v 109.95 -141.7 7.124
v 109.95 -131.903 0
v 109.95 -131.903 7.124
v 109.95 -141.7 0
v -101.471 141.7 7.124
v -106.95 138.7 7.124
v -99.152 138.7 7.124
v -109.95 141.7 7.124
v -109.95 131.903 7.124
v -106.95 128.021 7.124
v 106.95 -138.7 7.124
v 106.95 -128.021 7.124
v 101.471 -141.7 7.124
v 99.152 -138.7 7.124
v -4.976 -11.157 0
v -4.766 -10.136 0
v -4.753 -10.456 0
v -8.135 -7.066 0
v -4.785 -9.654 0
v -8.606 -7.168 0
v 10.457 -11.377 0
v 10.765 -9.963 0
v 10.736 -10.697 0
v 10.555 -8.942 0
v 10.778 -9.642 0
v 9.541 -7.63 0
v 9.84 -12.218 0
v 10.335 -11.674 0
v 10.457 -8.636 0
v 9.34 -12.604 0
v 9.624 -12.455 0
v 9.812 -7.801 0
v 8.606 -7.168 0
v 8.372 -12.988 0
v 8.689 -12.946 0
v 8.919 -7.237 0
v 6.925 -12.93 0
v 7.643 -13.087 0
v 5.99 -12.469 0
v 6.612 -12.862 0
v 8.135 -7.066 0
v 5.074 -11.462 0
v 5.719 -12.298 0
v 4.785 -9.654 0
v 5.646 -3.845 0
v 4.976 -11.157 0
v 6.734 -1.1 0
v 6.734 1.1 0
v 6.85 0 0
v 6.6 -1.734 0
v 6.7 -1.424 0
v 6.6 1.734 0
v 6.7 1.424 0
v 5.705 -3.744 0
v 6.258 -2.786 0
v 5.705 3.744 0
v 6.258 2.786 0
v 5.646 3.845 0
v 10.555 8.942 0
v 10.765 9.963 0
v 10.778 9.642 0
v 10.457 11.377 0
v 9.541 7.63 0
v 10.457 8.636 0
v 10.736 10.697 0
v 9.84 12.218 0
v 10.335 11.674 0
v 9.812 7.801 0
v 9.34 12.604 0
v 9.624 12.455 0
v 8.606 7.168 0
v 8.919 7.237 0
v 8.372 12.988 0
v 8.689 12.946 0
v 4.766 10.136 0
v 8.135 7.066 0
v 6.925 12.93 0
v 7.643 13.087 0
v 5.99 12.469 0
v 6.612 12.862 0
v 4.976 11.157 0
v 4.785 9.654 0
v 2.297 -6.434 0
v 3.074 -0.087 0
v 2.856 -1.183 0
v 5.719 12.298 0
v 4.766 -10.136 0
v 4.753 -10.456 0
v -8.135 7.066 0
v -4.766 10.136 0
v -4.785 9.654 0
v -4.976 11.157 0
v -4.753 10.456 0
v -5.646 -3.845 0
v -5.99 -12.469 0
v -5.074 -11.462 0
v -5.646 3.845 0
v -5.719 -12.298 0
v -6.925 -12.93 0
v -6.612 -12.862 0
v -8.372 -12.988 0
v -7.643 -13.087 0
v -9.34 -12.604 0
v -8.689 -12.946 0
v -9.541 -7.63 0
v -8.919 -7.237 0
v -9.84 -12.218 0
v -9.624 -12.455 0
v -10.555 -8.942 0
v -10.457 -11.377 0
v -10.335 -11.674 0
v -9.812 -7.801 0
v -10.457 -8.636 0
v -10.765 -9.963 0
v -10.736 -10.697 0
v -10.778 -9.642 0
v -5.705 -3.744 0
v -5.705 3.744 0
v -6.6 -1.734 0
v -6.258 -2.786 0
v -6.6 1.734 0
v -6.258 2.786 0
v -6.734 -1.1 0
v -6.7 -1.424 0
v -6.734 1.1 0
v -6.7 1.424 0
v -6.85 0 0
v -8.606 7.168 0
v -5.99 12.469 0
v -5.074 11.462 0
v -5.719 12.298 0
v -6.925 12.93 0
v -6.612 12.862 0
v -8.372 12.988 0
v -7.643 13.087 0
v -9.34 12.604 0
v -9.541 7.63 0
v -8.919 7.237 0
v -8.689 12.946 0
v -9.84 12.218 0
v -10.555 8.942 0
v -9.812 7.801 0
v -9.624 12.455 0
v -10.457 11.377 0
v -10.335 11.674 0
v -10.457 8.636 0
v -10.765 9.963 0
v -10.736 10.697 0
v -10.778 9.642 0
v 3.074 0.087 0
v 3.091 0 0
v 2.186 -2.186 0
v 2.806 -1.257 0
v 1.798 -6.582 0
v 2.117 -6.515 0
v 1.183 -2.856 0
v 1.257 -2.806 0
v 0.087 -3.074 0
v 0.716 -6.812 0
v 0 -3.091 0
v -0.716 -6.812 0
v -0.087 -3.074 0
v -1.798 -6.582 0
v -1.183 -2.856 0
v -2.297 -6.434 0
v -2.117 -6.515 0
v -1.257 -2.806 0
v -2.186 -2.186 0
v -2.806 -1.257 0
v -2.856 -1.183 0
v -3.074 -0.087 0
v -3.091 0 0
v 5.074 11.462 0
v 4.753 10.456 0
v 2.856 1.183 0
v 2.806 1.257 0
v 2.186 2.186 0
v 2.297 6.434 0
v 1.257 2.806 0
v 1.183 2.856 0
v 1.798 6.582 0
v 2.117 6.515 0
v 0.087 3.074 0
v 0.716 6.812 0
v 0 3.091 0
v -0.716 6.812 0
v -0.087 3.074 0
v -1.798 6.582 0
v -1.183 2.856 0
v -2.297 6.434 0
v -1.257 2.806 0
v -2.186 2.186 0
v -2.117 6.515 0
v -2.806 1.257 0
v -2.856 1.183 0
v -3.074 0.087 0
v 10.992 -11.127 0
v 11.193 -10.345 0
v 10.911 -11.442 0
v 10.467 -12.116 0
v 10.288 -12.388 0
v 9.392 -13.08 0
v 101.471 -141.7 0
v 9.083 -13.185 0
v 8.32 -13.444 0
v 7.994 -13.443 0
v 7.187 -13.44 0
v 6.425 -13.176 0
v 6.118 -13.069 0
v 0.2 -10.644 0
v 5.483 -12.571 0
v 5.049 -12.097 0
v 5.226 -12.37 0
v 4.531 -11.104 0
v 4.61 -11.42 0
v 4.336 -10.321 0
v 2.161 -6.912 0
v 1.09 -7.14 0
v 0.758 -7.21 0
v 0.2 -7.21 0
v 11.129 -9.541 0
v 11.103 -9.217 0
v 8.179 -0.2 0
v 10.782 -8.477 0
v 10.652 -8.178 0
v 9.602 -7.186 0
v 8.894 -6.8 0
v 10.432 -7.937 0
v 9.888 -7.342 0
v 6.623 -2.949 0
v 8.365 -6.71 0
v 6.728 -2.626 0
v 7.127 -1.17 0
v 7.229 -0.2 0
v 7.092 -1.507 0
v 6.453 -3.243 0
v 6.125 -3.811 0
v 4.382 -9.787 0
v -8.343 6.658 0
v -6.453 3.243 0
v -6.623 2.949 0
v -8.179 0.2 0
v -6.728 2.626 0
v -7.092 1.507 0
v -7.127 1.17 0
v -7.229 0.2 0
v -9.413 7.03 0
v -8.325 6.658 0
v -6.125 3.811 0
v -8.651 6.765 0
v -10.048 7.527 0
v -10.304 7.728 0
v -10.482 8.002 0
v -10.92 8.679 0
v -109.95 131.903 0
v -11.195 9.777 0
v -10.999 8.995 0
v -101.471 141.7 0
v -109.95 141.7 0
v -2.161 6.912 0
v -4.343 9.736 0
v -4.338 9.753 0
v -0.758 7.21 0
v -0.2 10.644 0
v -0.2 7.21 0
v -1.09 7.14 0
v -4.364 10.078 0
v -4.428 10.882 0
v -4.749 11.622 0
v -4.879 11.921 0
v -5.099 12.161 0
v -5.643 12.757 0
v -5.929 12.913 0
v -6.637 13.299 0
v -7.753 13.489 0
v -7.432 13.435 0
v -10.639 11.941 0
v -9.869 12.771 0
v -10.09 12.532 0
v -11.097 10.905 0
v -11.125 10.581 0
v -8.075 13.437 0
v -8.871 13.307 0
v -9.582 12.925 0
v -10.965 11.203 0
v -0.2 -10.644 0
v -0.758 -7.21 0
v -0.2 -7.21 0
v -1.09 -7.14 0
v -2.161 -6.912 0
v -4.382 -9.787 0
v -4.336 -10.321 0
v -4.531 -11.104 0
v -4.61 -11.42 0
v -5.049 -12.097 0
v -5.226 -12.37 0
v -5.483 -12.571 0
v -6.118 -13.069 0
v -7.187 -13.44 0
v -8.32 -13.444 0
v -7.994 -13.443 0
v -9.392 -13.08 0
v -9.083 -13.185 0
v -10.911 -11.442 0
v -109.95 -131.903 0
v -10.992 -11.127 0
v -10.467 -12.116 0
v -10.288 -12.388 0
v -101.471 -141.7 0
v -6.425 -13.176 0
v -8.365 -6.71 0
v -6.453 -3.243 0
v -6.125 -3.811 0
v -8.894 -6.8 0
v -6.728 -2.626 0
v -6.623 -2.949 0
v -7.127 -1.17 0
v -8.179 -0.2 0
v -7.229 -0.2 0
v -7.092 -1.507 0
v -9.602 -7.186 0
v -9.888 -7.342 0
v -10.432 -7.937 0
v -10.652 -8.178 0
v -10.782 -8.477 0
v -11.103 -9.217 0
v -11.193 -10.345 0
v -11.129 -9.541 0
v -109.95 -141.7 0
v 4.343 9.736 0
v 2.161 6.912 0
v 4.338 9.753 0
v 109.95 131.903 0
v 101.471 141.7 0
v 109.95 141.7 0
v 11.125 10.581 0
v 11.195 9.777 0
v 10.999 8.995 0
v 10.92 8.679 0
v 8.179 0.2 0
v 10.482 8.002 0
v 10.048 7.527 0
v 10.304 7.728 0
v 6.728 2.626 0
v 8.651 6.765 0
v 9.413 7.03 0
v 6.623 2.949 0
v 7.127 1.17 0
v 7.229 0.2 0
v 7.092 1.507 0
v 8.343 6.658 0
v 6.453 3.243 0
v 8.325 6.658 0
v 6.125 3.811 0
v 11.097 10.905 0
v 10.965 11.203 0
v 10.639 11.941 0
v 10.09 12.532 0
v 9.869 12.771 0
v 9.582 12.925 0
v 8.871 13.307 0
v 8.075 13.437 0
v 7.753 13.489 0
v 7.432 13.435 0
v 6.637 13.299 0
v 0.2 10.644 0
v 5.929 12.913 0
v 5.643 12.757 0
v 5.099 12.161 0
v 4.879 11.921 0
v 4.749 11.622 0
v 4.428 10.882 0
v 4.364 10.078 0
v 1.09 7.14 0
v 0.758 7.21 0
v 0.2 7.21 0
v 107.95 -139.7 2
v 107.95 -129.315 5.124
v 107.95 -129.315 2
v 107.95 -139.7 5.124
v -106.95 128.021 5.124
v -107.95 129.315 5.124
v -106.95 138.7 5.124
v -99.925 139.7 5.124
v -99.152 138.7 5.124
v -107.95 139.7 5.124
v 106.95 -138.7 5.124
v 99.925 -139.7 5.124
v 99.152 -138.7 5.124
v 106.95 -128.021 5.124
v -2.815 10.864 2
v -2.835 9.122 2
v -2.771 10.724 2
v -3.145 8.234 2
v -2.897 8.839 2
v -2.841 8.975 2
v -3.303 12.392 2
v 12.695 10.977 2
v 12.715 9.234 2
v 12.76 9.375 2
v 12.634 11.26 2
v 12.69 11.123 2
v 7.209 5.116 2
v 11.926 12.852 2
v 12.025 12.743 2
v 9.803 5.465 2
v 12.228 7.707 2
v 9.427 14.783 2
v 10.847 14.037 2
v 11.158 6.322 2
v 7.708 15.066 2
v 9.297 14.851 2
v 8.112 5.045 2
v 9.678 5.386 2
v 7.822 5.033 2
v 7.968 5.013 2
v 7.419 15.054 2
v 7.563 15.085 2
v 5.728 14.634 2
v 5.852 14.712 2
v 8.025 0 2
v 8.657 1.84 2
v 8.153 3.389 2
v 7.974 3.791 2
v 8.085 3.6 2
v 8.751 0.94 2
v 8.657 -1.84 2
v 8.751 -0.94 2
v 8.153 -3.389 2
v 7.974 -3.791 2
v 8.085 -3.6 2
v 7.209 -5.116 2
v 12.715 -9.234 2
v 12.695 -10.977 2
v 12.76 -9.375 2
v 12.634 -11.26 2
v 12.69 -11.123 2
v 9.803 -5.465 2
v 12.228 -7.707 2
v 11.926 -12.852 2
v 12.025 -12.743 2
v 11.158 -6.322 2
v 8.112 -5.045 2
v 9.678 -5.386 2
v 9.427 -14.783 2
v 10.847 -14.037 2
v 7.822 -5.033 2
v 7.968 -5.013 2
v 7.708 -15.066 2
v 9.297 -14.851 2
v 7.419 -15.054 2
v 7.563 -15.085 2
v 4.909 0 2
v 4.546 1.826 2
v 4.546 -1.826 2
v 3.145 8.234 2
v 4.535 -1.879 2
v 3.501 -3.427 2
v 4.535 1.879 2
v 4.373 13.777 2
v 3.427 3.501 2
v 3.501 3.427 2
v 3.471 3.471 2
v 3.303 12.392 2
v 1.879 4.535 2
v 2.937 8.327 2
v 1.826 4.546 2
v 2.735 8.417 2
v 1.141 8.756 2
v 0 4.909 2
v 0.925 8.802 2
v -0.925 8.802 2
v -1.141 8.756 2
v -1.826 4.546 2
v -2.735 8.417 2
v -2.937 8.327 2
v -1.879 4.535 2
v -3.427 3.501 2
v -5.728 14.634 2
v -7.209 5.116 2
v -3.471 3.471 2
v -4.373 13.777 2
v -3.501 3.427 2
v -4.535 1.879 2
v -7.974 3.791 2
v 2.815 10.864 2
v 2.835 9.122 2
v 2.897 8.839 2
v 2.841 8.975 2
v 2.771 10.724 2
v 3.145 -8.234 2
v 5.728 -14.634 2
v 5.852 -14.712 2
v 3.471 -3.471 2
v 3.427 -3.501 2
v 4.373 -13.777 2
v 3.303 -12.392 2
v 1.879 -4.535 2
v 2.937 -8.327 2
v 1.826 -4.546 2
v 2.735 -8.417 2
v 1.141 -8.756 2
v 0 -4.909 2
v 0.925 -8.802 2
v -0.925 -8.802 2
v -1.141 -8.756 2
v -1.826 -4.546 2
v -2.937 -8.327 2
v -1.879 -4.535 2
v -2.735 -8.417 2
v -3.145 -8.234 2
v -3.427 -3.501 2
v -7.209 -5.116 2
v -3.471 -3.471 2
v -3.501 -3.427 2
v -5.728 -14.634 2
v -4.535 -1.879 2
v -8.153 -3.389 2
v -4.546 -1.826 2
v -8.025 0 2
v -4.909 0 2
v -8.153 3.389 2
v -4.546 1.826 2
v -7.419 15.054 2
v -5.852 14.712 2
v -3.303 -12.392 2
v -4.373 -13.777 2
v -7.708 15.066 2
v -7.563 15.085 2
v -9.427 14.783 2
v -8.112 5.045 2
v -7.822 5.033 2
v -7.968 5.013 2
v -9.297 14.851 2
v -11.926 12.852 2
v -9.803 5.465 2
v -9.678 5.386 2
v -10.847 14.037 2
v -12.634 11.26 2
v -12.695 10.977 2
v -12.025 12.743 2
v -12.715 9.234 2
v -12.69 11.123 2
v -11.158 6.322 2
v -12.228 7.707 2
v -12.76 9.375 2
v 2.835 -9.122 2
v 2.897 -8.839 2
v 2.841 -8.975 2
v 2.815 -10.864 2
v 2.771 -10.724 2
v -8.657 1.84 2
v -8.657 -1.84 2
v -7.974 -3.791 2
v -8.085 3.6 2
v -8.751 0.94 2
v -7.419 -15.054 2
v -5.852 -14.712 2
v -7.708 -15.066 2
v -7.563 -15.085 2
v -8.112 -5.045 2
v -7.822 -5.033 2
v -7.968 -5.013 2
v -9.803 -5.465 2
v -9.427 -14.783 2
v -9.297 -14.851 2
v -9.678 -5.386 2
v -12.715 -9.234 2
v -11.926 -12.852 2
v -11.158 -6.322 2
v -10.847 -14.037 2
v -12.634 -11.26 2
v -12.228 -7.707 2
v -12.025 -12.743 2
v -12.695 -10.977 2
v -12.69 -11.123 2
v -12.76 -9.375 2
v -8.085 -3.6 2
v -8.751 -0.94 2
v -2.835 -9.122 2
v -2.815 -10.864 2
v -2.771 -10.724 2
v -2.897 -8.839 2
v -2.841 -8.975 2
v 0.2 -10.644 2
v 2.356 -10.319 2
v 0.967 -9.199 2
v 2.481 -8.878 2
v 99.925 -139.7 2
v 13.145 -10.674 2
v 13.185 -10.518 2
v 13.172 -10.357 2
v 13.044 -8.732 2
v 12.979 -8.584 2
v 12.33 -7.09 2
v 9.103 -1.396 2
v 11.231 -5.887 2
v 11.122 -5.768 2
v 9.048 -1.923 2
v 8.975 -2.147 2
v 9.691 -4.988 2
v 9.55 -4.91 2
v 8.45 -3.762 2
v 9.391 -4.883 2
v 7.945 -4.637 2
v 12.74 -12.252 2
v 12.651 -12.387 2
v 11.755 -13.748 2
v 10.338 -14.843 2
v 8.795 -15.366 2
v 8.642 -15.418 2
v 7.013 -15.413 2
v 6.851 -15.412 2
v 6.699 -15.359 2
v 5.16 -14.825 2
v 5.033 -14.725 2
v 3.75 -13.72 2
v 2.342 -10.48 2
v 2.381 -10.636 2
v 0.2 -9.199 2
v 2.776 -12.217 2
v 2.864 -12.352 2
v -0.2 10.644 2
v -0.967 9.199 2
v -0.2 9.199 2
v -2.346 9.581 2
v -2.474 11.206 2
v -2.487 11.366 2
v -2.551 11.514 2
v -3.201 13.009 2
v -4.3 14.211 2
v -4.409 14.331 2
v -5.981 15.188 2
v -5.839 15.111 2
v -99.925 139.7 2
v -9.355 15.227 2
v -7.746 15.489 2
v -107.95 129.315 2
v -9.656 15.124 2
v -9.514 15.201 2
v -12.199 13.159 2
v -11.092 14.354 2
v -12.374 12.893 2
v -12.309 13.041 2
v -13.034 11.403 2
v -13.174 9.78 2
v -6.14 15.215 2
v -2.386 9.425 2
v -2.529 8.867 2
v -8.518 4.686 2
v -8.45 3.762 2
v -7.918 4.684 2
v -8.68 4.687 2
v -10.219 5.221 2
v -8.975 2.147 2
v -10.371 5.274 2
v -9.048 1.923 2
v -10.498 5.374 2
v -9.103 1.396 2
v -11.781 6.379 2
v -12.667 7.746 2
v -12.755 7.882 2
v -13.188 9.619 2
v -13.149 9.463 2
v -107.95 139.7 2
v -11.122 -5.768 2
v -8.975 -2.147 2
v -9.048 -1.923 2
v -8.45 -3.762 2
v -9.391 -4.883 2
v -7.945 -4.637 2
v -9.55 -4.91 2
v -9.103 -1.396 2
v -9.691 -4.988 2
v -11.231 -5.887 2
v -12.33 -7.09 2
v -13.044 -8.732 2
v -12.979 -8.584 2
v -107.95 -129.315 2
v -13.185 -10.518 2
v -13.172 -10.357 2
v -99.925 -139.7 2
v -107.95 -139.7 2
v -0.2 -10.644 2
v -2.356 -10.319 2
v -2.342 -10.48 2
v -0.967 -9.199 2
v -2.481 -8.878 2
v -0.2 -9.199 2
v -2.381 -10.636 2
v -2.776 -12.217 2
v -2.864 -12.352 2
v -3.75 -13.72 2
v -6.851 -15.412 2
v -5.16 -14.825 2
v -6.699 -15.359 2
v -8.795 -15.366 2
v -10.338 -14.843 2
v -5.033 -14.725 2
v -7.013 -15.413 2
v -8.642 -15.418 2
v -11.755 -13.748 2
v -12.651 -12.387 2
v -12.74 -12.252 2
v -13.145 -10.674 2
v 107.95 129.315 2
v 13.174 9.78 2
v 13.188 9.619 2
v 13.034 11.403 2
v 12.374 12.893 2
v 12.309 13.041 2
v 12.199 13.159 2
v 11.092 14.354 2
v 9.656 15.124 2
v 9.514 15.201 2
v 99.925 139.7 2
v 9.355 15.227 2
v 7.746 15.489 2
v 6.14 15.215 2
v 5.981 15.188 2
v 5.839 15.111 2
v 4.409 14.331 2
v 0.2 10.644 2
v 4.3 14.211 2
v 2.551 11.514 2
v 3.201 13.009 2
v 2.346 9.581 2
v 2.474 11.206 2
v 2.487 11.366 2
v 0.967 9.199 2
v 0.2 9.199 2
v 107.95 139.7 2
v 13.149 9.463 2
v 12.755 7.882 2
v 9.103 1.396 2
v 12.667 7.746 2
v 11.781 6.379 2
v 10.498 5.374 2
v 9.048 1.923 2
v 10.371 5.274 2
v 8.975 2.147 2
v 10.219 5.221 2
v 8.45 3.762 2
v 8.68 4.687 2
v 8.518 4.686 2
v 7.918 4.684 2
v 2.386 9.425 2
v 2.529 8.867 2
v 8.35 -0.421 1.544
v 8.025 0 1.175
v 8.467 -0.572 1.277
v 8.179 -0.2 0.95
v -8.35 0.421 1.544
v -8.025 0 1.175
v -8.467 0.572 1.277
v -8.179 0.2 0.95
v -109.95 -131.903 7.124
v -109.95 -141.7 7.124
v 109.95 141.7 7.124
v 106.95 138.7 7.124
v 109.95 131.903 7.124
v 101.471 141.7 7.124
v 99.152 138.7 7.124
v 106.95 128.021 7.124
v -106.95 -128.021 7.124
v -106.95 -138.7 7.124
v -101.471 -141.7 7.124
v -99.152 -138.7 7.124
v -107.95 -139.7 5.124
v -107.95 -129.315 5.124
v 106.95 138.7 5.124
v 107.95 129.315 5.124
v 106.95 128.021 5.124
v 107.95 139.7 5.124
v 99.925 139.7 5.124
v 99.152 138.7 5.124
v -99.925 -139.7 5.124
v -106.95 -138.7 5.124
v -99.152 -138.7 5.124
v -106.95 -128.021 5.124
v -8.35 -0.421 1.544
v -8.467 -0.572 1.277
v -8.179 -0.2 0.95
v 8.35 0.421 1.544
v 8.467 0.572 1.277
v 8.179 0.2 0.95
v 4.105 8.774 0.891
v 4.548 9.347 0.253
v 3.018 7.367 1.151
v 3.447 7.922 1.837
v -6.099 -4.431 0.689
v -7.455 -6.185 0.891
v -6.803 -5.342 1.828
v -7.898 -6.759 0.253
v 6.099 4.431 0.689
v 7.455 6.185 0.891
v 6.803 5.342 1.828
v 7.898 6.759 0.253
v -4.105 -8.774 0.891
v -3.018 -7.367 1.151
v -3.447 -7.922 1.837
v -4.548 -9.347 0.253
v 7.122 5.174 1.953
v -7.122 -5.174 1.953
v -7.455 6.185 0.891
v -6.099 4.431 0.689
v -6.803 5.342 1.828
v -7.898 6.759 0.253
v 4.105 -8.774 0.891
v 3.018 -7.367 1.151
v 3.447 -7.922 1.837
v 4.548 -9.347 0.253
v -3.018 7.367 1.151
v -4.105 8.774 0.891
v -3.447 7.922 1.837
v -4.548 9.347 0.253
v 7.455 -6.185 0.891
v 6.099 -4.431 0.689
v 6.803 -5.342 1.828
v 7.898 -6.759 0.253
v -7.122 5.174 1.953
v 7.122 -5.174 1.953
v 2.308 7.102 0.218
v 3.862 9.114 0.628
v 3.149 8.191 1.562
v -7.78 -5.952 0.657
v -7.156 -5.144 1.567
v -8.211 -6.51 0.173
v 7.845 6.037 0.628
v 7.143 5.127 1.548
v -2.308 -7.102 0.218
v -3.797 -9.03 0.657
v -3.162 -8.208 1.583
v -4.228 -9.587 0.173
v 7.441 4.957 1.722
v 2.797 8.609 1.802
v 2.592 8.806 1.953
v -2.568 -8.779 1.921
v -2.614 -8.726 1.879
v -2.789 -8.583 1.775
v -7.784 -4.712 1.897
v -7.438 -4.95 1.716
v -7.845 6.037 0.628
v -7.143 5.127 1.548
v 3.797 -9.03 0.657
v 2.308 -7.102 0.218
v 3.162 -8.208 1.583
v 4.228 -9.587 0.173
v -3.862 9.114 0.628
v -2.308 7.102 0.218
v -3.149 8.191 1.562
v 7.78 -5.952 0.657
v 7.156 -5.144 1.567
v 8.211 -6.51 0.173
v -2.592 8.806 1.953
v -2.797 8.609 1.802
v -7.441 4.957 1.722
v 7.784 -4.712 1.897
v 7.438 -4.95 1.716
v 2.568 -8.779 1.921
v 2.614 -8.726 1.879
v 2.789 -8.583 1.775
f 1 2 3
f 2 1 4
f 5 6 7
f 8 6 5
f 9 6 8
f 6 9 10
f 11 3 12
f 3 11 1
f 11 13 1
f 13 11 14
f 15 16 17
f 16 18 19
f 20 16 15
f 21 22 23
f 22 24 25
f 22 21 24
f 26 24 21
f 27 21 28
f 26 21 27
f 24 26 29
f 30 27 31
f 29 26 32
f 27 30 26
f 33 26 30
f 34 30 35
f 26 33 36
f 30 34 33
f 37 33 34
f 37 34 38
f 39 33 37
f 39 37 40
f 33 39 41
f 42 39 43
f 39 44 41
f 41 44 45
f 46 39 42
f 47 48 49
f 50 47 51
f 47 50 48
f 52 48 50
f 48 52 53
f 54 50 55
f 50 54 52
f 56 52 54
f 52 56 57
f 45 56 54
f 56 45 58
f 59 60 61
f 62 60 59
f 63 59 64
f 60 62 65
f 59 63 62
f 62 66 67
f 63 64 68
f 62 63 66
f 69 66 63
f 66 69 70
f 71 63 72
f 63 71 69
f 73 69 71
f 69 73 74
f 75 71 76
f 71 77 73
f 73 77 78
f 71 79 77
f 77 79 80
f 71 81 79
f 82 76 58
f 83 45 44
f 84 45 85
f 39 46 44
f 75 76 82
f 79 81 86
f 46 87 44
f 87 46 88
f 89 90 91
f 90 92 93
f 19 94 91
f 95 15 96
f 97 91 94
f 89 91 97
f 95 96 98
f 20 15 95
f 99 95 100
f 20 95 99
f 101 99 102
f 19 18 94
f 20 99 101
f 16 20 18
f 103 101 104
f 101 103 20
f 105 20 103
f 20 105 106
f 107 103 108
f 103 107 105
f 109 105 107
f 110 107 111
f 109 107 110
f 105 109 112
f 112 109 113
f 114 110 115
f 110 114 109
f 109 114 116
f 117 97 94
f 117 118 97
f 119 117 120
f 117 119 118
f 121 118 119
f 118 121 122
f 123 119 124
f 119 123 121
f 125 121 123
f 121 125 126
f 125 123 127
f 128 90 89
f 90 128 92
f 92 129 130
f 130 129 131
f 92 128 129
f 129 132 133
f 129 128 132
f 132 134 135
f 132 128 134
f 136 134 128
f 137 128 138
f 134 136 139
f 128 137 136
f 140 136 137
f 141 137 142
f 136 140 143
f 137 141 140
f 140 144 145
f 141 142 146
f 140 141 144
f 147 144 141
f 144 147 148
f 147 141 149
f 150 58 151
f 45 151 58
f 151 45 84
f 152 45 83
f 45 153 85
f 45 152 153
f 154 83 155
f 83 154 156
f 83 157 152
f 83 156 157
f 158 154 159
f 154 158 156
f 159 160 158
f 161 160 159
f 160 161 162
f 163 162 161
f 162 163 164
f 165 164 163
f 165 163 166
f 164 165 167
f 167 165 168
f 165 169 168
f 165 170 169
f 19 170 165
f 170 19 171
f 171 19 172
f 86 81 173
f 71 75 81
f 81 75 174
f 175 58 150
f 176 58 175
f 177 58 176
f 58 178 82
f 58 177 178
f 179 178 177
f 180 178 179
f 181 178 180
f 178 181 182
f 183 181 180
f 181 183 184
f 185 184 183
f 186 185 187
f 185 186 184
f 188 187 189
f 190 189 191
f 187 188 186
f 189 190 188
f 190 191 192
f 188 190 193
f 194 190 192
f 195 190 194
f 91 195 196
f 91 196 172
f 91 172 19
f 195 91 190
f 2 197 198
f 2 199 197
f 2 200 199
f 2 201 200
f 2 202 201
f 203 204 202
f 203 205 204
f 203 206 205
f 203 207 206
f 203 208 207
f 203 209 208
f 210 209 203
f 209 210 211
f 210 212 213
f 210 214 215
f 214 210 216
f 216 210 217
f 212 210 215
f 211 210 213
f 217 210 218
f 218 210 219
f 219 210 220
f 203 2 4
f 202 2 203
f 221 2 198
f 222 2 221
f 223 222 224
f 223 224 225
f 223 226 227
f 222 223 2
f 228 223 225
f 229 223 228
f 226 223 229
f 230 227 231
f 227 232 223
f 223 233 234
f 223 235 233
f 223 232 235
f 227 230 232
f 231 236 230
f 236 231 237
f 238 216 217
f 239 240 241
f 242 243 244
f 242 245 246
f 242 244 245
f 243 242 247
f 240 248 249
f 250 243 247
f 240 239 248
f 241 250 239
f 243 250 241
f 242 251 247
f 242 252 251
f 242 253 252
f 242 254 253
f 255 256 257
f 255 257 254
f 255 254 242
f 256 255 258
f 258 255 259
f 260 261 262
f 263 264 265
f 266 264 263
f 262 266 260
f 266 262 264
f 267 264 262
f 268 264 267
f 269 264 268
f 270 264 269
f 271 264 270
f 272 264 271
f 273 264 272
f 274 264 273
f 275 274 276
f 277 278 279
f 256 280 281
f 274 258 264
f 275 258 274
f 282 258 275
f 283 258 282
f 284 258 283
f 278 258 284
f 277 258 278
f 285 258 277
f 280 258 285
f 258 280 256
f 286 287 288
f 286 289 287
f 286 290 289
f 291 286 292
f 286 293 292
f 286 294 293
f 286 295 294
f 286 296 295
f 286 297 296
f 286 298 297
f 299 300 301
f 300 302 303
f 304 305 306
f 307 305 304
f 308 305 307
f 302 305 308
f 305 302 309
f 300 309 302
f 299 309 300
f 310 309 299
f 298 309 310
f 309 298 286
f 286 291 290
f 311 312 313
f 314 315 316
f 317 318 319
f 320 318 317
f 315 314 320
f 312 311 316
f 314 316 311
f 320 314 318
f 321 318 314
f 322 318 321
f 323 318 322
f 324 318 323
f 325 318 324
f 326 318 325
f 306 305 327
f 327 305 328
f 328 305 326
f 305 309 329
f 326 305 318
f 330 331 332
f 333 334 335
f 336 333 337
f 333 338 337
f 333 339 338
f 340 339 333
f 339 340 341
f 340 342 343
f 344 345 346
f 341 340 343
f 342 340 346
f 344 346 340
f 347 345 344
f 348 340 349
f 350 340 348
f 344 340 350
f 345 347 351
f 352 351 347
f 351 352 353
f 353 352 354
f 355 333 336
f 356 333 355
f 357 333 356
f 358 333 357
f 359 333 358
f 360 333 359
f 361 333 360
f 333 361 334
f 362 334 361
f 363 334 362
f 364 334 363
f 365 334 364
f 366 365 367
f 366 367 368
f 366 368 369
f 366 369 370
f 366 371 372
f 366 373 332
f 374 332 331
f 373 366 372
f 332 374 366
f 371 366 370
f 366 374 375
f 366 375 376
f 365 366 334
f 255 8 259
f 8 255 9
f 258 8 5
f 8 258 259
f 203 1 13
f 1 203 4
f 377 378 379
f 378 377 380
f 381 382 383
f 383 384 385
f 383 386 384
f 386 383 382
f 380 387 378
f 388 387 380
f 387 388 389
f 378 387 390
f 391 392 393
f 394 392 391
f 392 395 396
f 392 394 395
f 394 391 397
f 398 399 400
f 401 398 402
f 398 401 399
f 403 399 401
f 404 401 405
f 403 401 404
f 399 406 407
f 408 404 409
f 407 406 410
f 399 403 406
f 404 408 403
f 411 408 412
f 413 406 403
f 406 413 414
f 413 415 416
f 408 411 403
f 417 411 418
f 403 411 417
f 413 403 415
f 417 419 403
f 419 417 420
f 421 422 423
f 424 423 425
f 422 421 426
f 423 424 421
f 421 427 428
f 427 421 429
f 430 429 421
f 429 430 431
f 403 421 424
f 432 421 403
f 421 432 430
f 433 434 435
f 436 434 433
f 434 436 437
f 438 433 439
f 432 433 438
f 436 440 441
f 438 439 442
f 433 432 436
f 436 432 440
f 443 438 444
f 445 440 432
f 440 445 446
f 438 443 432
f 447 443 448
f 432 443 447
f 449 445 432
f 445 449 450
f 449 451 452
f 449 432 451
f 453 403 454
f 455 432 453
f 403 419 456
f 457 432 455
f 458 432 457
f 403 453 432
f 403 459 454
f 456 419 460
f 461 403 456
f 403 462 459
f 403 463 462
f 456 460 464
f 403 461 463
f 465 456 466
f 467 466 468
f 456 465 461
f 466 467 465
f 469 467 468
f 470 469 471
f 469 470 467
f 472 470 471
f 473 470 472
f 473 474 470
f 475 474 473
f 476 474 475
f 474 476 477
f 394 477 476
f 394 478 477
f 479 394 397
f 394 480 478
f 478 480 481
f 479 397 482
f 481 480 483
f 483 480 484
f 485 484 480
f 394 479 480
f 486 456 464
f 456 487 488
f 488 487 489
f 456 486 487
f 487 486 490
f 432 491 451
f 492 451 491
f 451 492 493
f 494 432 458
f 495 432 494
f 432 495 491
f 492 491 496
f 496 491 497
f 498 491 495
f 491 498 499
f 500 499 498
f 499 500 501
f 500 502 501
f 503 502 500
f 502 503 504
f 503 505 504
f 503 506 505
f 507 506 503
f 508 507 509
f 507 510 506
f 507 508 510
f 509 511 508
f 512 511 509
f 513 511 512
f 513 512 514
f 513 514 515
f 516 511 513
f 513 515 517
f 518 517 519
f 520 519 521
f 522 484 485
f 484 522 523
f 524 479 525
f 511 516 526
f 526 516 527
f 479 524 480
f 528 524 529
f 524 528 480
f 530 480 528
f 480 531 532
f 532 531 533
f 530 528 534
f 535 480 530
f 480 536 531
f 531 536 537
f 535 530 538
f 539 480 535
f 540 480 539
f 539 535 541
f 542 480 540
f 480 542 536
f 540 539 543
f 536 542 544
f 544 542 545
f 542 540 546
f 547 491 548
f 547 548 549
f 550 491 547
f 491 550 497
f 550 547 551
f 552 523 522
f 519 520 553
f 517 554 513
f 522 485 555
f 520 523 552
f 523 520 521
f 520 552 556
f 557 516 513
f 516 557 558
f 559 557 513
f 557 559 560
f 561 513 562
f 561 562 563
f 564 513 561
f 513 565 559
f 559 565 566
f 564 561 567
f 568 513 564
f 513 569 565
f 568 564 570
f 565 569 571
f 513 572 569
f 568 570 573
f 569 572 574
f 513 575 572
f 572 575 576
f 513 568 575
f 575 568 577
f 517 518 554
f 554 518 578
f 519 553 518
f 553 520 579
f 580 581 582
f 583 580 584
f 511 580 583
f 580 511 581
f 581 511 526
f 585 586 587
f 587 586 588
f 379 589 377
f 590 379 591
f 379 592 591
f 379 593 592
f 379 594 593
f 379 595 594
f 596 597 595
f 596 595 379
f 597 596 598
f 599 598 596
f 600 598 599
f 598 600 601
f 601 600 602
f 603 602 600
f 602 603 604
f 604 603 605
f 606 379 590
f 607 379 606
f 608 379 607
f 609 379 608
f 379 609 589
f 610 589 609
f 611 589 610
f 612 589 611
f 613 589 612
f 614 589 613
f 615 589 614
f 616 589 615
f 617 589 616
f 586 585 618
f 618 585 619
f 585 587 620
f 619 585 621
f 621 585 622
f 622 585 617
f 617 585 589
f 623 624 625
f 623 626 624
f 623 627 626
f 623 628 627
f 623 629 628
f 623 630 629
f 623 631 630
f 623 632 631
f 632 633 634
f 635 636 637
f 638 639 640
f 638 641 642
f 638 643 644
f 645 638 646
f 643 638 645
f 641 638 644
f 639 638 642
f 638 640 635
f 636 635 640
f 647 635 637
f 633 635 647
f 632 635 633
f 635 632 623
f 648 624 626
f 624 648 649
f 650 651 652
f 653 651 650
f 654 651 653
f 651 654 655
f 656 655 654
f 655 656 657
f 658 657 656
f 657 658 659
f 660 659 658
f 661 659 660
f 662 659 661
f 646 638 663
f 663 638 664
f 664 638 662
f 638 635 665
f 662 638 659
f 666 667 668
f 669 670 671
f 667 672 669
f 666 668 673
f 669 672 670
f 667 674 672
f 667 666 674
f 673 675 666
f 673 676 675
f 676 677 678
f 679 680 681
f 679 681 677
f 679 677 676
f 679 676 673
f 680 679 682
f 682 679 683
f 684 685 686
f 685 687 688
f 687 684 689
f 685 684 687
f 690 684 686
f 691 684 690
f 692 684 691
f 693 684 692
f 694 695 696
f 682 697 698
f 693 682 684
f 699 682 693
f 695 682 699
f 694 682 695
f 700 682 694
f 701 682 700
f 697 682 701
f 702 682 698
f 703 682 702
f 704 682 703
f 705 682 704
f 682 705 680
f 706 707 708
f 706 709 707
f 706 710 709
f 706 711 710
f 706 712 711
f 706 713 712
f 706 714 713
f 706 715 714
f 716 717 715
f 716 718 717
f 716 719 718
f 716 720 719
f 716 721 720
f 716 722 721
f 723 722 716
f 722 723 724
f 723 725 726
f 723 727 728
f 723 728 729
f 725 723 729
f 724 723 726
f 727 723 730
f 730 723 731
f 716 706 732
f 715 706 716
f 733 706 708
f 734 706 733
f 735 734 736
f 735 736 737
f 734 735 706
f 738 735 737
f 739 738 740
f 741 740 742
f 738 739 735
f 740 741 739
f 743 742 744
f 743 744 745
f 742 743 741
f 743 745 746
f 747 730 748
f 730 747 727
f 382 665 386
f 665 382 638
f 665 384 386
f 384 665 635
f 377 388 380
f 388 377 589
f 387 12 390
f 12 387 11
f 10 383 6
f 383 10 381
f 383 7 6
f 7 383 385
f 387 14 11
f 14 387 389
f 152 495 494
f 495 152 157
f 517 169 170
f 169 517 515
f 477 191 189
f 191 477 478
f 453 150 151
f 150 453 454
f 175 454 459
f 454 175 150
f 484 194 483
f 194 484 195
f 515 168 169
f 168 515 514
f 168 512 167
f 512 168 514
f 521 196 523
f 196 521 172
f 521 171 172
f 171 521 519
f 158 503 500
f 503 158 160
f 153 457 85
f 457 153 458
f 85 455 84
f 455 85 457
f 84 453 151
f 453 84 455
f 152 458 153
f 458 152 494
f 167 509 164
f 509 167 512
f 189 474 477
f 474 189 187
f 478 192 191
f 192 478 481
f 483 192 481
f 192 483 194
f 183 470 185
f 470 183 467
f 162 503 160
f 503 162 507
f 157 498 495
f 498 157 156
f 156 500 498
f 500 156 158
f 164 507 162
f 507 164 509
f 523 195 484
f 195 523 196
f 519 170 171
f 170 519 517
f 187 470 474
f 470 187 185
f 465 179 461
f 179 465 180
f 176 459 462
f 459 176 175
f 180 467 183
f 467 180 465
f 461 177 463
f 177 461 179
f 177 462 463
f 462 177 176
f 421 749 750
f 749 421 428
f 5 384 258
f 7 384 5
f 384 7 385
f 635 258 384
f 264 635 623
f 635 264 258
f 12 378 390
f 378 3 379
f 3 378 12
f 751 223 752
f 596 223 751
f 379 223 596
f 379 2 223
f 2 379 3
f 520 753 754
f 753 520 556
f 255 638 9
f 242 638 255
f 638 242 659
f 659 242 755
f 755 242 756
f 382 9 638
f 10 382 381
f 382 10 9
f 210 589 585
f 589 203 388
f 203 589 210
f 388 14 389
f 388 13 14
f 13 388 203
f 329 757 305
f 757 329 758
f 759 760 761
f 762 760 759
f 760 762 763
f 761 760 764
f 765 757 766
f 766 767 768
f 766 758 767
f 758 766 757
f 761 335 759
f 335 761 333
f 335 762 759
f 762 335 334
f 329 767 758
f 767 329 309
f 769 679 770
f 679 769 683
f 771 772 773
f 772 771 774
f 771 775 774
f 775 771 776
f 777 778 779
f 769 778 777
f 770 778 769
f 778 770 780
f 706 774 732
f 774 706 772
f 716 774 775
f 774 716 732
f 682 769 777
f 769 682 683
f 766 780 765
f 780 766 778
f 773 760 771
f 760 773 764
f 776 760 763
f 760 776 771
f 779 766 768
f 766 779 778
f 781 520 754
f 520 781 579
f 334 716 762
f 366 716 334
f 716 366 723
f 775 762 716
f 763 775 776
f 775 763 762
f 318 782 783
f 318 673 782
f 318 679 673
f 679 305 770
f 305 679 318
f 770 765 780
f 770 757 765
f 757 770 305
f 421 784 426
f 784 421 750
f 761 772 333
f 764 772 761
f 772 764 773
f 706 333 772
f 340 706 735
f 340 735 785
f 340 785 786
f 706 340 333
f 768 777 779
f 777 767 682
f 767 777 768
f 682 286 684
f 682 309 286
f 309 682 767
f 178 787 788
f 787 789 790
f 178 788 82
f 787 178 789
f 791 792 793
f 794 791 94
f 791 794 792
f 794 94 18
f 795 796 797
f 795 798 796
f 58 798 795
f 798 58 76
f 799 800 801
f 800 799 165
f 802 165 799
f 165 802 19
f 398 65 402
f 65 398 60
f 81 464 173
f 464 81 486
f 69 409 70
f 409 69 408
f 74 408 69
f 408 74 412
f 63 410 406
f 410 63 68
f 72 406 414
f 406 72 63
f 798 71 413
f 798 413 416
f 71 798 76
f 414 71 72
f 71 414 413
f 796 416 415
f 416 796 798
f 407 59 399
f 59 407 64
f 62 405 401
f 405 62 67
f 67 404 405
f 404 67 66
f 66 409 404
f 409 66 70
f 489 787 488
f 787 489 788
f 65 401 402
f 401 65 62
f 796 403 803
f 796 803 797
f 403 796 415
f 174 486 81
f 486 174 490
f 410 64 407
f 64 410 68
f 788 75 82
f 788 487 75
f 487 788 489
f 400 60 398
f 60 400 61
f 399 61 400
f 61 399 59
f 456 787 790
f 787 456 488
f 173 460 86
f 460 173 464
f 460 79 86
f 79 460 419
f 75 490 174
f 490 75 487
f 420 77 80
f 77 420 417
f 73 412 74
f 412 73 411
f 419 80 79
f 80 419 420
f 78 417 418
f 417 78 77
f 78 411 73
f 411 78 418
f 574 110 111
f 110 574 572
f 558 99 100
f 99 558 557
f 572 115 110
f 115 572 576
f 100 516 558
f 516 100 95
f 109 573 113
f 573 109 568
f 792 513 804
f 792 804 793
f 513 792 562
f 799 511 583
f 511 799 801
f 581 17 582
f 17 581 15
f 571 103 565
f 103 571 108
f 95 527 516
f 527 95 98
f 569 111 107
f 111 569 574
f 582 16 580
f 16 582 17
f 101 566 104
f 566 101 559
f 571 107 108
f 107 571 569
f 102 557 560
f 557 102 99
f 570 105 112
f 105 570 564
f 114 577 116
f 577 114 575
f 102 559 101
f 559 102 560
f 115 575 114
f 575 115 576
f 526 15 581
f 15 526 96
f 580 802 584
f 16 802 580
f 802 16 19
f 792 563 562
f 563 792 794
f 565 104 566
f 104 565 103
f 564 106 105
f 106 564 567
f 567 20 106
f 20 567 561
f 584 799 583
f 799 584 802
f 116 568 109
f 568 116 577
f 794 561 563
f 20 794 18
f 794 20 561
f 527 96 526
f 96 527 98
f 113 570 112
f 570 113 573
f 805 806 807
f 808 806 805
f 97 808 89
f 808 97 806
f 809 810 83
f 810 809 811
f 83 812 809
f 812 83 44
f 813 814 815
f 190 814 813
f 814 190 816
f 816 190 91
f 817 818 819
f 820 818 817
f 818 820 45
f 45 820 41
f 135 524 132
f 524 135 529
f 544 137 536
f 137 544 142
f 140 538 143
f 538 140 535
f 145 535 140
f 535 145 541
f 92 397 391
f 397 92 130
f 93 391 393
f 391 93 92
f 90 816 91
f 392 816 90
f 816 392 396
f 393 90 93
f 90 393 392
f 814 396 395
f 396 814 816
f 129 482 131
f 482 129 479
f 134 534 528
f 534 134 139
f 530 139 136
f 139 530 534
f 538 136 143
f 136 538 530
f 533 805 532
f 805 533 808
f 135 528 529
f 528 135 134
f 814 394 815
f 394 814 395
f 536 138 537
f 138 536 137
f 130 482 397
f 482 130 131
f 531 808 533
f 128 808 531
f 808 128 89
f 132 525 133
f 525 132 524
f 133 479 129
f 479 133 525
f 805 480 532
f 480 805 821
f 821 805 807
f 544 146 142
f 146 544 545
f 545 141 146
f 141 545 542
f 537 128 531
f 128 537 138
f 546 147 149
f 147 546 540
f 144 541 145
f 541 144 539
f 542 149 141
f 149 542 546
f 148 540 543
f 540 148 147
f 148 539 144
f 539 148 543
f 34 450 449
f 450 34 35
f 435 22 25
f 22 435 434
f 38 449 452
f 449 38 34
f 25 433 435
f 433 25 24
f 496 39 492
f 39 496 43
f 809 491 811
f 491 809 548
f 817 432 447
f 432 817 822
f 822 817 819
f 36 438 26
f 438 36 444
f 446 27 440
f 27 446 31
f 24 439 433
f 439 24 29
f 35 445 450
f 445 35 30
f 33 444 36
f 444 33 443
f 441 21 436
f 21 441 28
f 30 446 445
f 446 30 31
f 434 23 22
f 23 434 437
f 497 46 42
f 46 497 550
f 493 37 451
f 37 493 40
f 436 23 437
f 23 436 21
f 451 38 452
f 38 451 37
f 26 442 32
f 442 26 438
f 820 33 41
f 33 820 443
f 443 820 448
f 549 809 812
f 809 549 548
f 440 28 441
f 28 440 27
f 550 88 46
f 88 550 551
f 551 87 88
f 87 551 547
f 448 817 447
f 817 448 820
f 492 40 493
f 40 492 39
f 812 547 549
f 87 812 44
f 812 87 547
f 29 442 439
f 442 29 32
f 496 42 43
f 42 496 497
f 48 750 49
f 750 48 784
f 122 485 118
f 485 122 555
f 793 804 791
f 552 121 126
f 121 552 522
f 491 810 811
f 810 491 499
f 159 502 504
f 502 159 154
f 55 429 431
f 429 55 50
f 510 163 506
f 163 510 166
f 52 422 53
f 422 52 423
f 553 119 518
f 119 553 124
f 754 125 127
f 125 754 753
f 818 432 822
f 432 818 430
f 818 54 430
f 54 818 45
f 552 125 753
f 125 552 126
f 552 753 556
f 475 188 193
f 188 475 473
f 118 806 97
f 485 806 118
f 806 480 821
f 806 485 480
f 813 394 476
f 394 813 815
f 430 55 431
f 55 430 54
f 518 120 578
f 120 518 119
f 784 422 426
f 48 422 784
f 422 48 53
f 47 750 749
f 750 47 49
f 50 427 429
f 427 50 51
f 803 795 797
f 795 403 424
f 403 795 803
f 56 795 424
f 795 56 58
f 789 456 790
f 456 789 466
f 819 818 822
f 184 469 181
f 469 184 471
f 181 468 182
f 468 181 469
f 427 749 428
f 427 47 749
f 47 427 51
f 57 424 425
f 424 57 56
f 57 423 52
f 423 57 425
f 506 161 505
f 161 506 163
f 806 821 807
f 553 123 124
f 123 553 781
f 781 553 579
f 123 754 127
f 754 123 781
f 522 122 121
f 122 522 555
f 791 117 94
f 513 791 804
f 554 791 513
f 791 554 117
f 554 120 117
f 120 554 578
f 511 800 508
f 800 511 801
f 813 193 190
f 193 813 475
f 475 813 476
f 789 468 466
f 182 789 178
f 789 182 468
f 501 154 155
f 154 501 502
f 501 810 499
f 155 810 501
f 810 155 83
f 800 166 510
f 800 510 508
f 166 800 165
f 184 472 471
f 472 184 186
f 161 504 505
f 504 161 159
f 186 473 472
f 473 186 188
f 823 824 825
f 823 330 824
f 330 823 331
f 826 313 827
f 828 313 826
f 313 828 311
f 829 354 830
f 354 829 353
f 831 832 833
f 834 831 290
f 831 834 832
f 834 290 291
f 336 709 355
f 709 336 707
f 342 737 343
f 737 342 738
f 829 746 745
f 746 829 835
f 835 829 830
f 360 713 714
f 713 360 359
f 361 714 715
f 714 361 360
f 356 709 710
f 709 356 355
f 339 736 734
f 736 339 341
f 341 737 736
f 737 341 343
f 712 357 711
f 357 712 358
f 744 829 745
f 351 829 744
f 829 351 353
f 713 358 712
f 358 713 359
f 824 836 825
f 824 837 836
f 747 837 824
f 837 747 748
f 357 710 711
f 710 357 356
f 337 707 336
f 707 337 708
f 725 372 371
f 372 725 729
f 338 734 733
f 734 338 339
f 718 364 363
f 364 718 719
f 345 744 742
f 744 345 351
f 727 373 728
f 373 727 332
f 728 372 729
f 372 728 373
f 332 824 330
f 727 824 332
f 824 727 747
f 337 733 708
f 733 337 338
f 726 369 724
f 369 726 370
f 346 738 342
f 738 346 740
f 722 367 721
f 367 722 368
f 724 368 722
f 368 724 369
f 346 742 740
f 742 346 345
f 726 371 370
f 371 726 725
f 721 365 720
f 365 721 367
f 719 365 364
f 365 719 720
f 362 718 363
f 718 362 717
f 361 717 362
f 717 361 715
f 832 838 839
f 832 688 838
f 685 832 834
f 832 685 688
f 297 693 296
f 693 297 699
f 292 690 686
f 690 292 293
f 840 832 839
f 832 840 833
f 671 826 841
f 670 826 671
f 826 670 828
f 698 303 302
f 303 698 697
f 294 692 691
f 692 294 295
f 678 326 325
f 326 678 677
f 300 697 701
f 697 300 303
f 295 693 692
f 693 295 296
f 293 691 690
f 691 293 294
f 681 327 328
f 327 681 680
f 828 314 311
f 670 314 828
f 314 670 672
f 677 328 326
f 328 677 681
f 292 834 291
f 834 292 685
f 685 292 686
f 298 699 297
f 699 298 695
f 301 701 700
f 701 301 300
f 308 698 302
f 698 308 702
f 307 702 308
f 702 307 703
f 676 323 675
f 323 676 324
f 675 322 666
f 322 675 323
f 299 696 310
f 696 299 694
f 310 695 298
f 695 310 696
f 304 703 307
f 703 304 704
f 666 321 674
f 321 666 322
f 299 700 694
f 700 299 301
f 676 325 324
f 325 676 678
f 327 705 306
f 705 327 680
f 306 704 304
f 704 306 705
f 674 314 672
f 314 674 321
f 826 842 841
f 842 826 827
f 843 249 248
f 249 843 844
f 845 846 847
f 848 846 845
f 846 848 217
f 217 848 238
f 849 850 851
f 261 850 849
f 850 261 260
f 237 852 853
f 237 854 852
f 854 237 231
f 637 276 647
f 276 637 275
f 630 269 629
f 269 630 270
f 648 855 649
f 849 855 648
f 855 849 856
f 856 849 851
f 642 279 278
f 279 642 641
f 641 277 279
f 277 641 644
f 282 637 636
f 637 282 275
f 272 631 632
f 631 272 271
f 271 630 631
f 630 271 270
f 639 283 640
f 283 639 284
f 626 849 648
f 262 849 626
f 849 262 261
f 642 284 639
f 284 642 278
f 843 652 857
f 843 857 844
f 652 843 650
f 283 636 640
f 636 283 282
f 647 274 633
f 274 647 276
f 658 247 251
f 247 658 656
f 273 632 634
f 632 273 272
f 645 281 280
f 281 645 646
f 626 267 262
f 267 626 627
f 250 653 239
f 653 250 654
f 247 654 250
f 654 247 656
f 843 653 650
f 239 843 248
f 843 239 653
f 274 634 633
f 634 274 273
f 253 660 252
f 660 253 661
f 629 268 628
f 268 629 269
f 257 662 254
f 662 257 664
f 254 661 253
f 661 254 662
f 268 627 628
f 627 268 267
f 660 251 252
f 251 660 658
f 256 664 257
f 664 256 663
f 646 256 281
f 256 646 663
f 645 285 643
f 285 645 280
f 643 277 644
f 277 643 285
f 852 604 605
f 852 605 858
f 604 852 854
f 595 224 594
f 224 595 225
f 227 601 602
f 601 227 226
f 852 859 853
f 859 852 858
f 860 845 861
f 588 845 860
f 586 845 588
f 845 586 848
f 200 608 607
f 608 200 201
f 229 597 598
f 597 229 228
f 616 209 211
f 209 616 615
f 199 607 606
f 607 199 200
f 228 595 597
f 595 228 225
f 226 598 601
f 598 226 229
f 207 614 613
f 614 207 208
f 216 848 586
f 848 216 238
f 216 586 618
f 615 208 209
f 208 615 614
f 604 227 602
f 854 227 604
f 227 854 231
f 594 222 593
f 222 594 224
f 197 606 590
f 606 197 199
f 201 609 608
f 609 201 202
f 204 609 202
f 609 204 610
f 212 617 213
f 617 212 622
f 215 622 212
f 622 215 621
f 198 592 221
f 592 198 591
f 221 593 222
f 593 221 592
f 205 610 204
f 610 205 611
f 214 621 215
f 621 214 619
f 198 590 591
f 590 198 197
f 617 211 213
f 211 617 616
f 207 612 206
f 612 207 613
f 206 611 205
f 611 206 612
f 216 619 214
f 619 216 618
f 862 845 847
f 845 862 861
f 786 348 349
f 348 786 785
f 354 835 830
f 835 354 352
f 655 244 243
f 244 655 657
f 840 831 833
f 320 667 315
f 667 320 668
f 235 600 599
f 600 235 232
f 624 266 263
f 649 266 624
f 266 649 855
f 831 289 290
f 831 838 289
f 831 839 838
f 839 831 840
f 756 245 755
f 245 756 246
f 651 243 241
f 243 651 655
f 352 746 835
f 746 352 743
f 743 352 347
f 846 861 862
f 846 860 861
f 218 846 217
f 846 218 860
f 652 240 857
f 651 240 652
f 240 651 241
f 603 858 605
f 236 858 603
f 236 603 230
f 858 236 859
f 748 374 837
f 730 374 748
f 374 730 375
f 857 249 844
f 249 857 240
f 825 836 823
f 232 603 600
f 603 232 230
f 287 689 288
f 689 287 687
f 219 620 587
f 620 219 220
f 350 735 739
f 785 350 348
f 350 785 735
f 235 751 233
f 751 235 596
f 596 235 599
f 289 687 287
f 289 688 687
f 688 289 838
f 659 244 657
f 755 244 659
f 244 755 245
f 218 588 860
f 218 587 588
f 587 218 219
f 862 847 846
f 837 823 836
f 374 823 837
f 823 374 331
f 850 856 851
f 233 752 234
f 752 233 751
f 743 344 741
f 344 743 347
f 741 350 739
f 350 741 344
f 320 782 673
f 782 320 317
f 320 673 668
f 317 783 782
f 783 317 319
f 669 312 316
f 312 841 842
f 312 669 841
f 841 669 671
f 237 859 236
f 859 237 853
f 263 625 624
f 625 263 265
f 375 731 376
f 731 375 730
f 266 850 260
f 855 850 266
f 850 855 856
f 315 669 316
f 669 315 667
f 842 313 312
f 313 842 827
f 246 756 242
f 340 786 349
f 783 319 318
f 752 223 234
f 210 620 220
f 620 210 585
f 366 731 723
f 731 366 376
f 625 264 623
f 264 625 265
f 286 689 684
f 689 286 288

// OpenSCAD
// 8.5 x 11 paper holder

/* [Frame Dimensions] */

// Assembled or plated or individual parts?
part = 0; //[0:Preview, 1:Plate, 2:Center, 3:Left arm, 4:Right arm]

in = 25.4*1; // inch in mm, for conversions. *1 to hide in Customizer.

// Thickness of holder in mm
thick = 2;

// Paper width in inches or mm (use one)
widthInches = 8.5;
widthMM = 0;
// Paper height in inches or mm (use one)
heightInches = 11;
heightMM = 0;
// Paper thickness in inches or mm (use one)
thicknessInches = .123;
thicknessMM = 0;
// Arm width in inches or mm (use one)
armInches = .5;
armMM = 0;
band = armInches*in+armMM;

x=widthInches*in+widthMM;
y=heightInches*in+heightMM;
z=thicknessInches*in+thicknessMM;

r = x/y;
angle=atan(r);

xi = x-band/2;
yi=y-band/2;
xi=x;
yi=y;

diag = sqrt(xi*xi+yi*yi);

// Radius of center screw in mm
sr = 3;
// Gap for spacing between parts (tune for your printer)
gap=0.4;

spacing = 1.1*band;

module arm() {
intersection() {
	rotate([0,0,angle]) cube([band,2*y,z+3*thick], center=true);
	difference() {
		cube([x+2*thick,y+2*thick,z+2*thick],center=true);
		cube([x,y,z], center=true);
		translate([0,0,z/2]) cube([x-2,y-2,z+thick], center=true);
		translate([0,0,-(z/2+thick)-.1]) cylinder(r1=sr, r2=sr+thick, h=thick+.2);
		}
	}
}

module X () {
	arm();
	mirror([1,0,0]) arm();
	}

module plug(r, h) {
	//echo(r,h);
	cylinder(r1=r, r2=r+h, h=h, center=true);
	}

module centerCut() {
	translate([0,0,-z/2-thick/2]) {
		rotate([0,0,90-angle]) {
			cube([2*band,band/3,thick+1], center=true);
			translate([band,0,0]) plug(band/5,thick+1);
			translate([-band,0,0]) plug(band/5,thick+1);
			}
		rotate([0,0,90+angle]) {
			cube([2*band,band/3,thick+1], center=true);
			translate([band,0,0]) plug(band/5,thick+1);
			translate([-band,0,0]) plug(band/5,thick+1);
			}
		plug(band/2,thick+1);
		}
	}

module centerHole() {
	translate([0,0,-z/2-thick/2]) {
		rotate([0,0,90-angle]) {
			cube([2*band+2*gap,band/3+2*gap,thick+1], center=true);
			translate([band,0,0]) plug(band/5+gap,thick+1);
			translate([-band,0,0]) plug(band/5+gap,thick+1);
			}
		rotate([0,0,90+angle]) {
			cube([2*band+2*gap,band/3+2*gap,thick+1], center=true);
			translate([band,0,0]) plug(band/5+gap,thick+1);
			translate([-band,0,0]) plug(band/5+gap,thick+1);
			}
		plug(band/2+gap,thick+1);
		}
	cube([x,gap,band], center=true);
	cube([gap,y,band], center=true);;
	}

module center() {
	intersection () {
		X();
		centerCut();
		}
	}

module anArm() {
	intersection() {
		difference() {
			X();
			centerHole();
			}
		translate([0,0,-band/2]) cube([x,y,band]);
		}
	}

module plate() {
	translate([-spacing/2,-band/2,0]) rotate([0,0,90]) center();
	rotate([0,0,angle]) anArm();
	translate([spacing,0,0]) rotate([0,0,angle]) anArm();
	translate([-spacing,0,0]) mirror([1,0,0]) rotate([0,0,angle]) anArm();
	translate([-2*spacing,0,0]) mirror([1,0,0]) rotate([0,0,angle]) anArm();
	}

module preview() {
	center();
	difference() {
			X();
			centerHole();
			}
		}

translate([0,0,z/2+thick]) {
	if (part==0) preview();
	if (part==1) plate();
	if (part==2) center();
	if (part==3) anArm();
	if (part==4) mirror([1,0,0]) anArm();
	}
